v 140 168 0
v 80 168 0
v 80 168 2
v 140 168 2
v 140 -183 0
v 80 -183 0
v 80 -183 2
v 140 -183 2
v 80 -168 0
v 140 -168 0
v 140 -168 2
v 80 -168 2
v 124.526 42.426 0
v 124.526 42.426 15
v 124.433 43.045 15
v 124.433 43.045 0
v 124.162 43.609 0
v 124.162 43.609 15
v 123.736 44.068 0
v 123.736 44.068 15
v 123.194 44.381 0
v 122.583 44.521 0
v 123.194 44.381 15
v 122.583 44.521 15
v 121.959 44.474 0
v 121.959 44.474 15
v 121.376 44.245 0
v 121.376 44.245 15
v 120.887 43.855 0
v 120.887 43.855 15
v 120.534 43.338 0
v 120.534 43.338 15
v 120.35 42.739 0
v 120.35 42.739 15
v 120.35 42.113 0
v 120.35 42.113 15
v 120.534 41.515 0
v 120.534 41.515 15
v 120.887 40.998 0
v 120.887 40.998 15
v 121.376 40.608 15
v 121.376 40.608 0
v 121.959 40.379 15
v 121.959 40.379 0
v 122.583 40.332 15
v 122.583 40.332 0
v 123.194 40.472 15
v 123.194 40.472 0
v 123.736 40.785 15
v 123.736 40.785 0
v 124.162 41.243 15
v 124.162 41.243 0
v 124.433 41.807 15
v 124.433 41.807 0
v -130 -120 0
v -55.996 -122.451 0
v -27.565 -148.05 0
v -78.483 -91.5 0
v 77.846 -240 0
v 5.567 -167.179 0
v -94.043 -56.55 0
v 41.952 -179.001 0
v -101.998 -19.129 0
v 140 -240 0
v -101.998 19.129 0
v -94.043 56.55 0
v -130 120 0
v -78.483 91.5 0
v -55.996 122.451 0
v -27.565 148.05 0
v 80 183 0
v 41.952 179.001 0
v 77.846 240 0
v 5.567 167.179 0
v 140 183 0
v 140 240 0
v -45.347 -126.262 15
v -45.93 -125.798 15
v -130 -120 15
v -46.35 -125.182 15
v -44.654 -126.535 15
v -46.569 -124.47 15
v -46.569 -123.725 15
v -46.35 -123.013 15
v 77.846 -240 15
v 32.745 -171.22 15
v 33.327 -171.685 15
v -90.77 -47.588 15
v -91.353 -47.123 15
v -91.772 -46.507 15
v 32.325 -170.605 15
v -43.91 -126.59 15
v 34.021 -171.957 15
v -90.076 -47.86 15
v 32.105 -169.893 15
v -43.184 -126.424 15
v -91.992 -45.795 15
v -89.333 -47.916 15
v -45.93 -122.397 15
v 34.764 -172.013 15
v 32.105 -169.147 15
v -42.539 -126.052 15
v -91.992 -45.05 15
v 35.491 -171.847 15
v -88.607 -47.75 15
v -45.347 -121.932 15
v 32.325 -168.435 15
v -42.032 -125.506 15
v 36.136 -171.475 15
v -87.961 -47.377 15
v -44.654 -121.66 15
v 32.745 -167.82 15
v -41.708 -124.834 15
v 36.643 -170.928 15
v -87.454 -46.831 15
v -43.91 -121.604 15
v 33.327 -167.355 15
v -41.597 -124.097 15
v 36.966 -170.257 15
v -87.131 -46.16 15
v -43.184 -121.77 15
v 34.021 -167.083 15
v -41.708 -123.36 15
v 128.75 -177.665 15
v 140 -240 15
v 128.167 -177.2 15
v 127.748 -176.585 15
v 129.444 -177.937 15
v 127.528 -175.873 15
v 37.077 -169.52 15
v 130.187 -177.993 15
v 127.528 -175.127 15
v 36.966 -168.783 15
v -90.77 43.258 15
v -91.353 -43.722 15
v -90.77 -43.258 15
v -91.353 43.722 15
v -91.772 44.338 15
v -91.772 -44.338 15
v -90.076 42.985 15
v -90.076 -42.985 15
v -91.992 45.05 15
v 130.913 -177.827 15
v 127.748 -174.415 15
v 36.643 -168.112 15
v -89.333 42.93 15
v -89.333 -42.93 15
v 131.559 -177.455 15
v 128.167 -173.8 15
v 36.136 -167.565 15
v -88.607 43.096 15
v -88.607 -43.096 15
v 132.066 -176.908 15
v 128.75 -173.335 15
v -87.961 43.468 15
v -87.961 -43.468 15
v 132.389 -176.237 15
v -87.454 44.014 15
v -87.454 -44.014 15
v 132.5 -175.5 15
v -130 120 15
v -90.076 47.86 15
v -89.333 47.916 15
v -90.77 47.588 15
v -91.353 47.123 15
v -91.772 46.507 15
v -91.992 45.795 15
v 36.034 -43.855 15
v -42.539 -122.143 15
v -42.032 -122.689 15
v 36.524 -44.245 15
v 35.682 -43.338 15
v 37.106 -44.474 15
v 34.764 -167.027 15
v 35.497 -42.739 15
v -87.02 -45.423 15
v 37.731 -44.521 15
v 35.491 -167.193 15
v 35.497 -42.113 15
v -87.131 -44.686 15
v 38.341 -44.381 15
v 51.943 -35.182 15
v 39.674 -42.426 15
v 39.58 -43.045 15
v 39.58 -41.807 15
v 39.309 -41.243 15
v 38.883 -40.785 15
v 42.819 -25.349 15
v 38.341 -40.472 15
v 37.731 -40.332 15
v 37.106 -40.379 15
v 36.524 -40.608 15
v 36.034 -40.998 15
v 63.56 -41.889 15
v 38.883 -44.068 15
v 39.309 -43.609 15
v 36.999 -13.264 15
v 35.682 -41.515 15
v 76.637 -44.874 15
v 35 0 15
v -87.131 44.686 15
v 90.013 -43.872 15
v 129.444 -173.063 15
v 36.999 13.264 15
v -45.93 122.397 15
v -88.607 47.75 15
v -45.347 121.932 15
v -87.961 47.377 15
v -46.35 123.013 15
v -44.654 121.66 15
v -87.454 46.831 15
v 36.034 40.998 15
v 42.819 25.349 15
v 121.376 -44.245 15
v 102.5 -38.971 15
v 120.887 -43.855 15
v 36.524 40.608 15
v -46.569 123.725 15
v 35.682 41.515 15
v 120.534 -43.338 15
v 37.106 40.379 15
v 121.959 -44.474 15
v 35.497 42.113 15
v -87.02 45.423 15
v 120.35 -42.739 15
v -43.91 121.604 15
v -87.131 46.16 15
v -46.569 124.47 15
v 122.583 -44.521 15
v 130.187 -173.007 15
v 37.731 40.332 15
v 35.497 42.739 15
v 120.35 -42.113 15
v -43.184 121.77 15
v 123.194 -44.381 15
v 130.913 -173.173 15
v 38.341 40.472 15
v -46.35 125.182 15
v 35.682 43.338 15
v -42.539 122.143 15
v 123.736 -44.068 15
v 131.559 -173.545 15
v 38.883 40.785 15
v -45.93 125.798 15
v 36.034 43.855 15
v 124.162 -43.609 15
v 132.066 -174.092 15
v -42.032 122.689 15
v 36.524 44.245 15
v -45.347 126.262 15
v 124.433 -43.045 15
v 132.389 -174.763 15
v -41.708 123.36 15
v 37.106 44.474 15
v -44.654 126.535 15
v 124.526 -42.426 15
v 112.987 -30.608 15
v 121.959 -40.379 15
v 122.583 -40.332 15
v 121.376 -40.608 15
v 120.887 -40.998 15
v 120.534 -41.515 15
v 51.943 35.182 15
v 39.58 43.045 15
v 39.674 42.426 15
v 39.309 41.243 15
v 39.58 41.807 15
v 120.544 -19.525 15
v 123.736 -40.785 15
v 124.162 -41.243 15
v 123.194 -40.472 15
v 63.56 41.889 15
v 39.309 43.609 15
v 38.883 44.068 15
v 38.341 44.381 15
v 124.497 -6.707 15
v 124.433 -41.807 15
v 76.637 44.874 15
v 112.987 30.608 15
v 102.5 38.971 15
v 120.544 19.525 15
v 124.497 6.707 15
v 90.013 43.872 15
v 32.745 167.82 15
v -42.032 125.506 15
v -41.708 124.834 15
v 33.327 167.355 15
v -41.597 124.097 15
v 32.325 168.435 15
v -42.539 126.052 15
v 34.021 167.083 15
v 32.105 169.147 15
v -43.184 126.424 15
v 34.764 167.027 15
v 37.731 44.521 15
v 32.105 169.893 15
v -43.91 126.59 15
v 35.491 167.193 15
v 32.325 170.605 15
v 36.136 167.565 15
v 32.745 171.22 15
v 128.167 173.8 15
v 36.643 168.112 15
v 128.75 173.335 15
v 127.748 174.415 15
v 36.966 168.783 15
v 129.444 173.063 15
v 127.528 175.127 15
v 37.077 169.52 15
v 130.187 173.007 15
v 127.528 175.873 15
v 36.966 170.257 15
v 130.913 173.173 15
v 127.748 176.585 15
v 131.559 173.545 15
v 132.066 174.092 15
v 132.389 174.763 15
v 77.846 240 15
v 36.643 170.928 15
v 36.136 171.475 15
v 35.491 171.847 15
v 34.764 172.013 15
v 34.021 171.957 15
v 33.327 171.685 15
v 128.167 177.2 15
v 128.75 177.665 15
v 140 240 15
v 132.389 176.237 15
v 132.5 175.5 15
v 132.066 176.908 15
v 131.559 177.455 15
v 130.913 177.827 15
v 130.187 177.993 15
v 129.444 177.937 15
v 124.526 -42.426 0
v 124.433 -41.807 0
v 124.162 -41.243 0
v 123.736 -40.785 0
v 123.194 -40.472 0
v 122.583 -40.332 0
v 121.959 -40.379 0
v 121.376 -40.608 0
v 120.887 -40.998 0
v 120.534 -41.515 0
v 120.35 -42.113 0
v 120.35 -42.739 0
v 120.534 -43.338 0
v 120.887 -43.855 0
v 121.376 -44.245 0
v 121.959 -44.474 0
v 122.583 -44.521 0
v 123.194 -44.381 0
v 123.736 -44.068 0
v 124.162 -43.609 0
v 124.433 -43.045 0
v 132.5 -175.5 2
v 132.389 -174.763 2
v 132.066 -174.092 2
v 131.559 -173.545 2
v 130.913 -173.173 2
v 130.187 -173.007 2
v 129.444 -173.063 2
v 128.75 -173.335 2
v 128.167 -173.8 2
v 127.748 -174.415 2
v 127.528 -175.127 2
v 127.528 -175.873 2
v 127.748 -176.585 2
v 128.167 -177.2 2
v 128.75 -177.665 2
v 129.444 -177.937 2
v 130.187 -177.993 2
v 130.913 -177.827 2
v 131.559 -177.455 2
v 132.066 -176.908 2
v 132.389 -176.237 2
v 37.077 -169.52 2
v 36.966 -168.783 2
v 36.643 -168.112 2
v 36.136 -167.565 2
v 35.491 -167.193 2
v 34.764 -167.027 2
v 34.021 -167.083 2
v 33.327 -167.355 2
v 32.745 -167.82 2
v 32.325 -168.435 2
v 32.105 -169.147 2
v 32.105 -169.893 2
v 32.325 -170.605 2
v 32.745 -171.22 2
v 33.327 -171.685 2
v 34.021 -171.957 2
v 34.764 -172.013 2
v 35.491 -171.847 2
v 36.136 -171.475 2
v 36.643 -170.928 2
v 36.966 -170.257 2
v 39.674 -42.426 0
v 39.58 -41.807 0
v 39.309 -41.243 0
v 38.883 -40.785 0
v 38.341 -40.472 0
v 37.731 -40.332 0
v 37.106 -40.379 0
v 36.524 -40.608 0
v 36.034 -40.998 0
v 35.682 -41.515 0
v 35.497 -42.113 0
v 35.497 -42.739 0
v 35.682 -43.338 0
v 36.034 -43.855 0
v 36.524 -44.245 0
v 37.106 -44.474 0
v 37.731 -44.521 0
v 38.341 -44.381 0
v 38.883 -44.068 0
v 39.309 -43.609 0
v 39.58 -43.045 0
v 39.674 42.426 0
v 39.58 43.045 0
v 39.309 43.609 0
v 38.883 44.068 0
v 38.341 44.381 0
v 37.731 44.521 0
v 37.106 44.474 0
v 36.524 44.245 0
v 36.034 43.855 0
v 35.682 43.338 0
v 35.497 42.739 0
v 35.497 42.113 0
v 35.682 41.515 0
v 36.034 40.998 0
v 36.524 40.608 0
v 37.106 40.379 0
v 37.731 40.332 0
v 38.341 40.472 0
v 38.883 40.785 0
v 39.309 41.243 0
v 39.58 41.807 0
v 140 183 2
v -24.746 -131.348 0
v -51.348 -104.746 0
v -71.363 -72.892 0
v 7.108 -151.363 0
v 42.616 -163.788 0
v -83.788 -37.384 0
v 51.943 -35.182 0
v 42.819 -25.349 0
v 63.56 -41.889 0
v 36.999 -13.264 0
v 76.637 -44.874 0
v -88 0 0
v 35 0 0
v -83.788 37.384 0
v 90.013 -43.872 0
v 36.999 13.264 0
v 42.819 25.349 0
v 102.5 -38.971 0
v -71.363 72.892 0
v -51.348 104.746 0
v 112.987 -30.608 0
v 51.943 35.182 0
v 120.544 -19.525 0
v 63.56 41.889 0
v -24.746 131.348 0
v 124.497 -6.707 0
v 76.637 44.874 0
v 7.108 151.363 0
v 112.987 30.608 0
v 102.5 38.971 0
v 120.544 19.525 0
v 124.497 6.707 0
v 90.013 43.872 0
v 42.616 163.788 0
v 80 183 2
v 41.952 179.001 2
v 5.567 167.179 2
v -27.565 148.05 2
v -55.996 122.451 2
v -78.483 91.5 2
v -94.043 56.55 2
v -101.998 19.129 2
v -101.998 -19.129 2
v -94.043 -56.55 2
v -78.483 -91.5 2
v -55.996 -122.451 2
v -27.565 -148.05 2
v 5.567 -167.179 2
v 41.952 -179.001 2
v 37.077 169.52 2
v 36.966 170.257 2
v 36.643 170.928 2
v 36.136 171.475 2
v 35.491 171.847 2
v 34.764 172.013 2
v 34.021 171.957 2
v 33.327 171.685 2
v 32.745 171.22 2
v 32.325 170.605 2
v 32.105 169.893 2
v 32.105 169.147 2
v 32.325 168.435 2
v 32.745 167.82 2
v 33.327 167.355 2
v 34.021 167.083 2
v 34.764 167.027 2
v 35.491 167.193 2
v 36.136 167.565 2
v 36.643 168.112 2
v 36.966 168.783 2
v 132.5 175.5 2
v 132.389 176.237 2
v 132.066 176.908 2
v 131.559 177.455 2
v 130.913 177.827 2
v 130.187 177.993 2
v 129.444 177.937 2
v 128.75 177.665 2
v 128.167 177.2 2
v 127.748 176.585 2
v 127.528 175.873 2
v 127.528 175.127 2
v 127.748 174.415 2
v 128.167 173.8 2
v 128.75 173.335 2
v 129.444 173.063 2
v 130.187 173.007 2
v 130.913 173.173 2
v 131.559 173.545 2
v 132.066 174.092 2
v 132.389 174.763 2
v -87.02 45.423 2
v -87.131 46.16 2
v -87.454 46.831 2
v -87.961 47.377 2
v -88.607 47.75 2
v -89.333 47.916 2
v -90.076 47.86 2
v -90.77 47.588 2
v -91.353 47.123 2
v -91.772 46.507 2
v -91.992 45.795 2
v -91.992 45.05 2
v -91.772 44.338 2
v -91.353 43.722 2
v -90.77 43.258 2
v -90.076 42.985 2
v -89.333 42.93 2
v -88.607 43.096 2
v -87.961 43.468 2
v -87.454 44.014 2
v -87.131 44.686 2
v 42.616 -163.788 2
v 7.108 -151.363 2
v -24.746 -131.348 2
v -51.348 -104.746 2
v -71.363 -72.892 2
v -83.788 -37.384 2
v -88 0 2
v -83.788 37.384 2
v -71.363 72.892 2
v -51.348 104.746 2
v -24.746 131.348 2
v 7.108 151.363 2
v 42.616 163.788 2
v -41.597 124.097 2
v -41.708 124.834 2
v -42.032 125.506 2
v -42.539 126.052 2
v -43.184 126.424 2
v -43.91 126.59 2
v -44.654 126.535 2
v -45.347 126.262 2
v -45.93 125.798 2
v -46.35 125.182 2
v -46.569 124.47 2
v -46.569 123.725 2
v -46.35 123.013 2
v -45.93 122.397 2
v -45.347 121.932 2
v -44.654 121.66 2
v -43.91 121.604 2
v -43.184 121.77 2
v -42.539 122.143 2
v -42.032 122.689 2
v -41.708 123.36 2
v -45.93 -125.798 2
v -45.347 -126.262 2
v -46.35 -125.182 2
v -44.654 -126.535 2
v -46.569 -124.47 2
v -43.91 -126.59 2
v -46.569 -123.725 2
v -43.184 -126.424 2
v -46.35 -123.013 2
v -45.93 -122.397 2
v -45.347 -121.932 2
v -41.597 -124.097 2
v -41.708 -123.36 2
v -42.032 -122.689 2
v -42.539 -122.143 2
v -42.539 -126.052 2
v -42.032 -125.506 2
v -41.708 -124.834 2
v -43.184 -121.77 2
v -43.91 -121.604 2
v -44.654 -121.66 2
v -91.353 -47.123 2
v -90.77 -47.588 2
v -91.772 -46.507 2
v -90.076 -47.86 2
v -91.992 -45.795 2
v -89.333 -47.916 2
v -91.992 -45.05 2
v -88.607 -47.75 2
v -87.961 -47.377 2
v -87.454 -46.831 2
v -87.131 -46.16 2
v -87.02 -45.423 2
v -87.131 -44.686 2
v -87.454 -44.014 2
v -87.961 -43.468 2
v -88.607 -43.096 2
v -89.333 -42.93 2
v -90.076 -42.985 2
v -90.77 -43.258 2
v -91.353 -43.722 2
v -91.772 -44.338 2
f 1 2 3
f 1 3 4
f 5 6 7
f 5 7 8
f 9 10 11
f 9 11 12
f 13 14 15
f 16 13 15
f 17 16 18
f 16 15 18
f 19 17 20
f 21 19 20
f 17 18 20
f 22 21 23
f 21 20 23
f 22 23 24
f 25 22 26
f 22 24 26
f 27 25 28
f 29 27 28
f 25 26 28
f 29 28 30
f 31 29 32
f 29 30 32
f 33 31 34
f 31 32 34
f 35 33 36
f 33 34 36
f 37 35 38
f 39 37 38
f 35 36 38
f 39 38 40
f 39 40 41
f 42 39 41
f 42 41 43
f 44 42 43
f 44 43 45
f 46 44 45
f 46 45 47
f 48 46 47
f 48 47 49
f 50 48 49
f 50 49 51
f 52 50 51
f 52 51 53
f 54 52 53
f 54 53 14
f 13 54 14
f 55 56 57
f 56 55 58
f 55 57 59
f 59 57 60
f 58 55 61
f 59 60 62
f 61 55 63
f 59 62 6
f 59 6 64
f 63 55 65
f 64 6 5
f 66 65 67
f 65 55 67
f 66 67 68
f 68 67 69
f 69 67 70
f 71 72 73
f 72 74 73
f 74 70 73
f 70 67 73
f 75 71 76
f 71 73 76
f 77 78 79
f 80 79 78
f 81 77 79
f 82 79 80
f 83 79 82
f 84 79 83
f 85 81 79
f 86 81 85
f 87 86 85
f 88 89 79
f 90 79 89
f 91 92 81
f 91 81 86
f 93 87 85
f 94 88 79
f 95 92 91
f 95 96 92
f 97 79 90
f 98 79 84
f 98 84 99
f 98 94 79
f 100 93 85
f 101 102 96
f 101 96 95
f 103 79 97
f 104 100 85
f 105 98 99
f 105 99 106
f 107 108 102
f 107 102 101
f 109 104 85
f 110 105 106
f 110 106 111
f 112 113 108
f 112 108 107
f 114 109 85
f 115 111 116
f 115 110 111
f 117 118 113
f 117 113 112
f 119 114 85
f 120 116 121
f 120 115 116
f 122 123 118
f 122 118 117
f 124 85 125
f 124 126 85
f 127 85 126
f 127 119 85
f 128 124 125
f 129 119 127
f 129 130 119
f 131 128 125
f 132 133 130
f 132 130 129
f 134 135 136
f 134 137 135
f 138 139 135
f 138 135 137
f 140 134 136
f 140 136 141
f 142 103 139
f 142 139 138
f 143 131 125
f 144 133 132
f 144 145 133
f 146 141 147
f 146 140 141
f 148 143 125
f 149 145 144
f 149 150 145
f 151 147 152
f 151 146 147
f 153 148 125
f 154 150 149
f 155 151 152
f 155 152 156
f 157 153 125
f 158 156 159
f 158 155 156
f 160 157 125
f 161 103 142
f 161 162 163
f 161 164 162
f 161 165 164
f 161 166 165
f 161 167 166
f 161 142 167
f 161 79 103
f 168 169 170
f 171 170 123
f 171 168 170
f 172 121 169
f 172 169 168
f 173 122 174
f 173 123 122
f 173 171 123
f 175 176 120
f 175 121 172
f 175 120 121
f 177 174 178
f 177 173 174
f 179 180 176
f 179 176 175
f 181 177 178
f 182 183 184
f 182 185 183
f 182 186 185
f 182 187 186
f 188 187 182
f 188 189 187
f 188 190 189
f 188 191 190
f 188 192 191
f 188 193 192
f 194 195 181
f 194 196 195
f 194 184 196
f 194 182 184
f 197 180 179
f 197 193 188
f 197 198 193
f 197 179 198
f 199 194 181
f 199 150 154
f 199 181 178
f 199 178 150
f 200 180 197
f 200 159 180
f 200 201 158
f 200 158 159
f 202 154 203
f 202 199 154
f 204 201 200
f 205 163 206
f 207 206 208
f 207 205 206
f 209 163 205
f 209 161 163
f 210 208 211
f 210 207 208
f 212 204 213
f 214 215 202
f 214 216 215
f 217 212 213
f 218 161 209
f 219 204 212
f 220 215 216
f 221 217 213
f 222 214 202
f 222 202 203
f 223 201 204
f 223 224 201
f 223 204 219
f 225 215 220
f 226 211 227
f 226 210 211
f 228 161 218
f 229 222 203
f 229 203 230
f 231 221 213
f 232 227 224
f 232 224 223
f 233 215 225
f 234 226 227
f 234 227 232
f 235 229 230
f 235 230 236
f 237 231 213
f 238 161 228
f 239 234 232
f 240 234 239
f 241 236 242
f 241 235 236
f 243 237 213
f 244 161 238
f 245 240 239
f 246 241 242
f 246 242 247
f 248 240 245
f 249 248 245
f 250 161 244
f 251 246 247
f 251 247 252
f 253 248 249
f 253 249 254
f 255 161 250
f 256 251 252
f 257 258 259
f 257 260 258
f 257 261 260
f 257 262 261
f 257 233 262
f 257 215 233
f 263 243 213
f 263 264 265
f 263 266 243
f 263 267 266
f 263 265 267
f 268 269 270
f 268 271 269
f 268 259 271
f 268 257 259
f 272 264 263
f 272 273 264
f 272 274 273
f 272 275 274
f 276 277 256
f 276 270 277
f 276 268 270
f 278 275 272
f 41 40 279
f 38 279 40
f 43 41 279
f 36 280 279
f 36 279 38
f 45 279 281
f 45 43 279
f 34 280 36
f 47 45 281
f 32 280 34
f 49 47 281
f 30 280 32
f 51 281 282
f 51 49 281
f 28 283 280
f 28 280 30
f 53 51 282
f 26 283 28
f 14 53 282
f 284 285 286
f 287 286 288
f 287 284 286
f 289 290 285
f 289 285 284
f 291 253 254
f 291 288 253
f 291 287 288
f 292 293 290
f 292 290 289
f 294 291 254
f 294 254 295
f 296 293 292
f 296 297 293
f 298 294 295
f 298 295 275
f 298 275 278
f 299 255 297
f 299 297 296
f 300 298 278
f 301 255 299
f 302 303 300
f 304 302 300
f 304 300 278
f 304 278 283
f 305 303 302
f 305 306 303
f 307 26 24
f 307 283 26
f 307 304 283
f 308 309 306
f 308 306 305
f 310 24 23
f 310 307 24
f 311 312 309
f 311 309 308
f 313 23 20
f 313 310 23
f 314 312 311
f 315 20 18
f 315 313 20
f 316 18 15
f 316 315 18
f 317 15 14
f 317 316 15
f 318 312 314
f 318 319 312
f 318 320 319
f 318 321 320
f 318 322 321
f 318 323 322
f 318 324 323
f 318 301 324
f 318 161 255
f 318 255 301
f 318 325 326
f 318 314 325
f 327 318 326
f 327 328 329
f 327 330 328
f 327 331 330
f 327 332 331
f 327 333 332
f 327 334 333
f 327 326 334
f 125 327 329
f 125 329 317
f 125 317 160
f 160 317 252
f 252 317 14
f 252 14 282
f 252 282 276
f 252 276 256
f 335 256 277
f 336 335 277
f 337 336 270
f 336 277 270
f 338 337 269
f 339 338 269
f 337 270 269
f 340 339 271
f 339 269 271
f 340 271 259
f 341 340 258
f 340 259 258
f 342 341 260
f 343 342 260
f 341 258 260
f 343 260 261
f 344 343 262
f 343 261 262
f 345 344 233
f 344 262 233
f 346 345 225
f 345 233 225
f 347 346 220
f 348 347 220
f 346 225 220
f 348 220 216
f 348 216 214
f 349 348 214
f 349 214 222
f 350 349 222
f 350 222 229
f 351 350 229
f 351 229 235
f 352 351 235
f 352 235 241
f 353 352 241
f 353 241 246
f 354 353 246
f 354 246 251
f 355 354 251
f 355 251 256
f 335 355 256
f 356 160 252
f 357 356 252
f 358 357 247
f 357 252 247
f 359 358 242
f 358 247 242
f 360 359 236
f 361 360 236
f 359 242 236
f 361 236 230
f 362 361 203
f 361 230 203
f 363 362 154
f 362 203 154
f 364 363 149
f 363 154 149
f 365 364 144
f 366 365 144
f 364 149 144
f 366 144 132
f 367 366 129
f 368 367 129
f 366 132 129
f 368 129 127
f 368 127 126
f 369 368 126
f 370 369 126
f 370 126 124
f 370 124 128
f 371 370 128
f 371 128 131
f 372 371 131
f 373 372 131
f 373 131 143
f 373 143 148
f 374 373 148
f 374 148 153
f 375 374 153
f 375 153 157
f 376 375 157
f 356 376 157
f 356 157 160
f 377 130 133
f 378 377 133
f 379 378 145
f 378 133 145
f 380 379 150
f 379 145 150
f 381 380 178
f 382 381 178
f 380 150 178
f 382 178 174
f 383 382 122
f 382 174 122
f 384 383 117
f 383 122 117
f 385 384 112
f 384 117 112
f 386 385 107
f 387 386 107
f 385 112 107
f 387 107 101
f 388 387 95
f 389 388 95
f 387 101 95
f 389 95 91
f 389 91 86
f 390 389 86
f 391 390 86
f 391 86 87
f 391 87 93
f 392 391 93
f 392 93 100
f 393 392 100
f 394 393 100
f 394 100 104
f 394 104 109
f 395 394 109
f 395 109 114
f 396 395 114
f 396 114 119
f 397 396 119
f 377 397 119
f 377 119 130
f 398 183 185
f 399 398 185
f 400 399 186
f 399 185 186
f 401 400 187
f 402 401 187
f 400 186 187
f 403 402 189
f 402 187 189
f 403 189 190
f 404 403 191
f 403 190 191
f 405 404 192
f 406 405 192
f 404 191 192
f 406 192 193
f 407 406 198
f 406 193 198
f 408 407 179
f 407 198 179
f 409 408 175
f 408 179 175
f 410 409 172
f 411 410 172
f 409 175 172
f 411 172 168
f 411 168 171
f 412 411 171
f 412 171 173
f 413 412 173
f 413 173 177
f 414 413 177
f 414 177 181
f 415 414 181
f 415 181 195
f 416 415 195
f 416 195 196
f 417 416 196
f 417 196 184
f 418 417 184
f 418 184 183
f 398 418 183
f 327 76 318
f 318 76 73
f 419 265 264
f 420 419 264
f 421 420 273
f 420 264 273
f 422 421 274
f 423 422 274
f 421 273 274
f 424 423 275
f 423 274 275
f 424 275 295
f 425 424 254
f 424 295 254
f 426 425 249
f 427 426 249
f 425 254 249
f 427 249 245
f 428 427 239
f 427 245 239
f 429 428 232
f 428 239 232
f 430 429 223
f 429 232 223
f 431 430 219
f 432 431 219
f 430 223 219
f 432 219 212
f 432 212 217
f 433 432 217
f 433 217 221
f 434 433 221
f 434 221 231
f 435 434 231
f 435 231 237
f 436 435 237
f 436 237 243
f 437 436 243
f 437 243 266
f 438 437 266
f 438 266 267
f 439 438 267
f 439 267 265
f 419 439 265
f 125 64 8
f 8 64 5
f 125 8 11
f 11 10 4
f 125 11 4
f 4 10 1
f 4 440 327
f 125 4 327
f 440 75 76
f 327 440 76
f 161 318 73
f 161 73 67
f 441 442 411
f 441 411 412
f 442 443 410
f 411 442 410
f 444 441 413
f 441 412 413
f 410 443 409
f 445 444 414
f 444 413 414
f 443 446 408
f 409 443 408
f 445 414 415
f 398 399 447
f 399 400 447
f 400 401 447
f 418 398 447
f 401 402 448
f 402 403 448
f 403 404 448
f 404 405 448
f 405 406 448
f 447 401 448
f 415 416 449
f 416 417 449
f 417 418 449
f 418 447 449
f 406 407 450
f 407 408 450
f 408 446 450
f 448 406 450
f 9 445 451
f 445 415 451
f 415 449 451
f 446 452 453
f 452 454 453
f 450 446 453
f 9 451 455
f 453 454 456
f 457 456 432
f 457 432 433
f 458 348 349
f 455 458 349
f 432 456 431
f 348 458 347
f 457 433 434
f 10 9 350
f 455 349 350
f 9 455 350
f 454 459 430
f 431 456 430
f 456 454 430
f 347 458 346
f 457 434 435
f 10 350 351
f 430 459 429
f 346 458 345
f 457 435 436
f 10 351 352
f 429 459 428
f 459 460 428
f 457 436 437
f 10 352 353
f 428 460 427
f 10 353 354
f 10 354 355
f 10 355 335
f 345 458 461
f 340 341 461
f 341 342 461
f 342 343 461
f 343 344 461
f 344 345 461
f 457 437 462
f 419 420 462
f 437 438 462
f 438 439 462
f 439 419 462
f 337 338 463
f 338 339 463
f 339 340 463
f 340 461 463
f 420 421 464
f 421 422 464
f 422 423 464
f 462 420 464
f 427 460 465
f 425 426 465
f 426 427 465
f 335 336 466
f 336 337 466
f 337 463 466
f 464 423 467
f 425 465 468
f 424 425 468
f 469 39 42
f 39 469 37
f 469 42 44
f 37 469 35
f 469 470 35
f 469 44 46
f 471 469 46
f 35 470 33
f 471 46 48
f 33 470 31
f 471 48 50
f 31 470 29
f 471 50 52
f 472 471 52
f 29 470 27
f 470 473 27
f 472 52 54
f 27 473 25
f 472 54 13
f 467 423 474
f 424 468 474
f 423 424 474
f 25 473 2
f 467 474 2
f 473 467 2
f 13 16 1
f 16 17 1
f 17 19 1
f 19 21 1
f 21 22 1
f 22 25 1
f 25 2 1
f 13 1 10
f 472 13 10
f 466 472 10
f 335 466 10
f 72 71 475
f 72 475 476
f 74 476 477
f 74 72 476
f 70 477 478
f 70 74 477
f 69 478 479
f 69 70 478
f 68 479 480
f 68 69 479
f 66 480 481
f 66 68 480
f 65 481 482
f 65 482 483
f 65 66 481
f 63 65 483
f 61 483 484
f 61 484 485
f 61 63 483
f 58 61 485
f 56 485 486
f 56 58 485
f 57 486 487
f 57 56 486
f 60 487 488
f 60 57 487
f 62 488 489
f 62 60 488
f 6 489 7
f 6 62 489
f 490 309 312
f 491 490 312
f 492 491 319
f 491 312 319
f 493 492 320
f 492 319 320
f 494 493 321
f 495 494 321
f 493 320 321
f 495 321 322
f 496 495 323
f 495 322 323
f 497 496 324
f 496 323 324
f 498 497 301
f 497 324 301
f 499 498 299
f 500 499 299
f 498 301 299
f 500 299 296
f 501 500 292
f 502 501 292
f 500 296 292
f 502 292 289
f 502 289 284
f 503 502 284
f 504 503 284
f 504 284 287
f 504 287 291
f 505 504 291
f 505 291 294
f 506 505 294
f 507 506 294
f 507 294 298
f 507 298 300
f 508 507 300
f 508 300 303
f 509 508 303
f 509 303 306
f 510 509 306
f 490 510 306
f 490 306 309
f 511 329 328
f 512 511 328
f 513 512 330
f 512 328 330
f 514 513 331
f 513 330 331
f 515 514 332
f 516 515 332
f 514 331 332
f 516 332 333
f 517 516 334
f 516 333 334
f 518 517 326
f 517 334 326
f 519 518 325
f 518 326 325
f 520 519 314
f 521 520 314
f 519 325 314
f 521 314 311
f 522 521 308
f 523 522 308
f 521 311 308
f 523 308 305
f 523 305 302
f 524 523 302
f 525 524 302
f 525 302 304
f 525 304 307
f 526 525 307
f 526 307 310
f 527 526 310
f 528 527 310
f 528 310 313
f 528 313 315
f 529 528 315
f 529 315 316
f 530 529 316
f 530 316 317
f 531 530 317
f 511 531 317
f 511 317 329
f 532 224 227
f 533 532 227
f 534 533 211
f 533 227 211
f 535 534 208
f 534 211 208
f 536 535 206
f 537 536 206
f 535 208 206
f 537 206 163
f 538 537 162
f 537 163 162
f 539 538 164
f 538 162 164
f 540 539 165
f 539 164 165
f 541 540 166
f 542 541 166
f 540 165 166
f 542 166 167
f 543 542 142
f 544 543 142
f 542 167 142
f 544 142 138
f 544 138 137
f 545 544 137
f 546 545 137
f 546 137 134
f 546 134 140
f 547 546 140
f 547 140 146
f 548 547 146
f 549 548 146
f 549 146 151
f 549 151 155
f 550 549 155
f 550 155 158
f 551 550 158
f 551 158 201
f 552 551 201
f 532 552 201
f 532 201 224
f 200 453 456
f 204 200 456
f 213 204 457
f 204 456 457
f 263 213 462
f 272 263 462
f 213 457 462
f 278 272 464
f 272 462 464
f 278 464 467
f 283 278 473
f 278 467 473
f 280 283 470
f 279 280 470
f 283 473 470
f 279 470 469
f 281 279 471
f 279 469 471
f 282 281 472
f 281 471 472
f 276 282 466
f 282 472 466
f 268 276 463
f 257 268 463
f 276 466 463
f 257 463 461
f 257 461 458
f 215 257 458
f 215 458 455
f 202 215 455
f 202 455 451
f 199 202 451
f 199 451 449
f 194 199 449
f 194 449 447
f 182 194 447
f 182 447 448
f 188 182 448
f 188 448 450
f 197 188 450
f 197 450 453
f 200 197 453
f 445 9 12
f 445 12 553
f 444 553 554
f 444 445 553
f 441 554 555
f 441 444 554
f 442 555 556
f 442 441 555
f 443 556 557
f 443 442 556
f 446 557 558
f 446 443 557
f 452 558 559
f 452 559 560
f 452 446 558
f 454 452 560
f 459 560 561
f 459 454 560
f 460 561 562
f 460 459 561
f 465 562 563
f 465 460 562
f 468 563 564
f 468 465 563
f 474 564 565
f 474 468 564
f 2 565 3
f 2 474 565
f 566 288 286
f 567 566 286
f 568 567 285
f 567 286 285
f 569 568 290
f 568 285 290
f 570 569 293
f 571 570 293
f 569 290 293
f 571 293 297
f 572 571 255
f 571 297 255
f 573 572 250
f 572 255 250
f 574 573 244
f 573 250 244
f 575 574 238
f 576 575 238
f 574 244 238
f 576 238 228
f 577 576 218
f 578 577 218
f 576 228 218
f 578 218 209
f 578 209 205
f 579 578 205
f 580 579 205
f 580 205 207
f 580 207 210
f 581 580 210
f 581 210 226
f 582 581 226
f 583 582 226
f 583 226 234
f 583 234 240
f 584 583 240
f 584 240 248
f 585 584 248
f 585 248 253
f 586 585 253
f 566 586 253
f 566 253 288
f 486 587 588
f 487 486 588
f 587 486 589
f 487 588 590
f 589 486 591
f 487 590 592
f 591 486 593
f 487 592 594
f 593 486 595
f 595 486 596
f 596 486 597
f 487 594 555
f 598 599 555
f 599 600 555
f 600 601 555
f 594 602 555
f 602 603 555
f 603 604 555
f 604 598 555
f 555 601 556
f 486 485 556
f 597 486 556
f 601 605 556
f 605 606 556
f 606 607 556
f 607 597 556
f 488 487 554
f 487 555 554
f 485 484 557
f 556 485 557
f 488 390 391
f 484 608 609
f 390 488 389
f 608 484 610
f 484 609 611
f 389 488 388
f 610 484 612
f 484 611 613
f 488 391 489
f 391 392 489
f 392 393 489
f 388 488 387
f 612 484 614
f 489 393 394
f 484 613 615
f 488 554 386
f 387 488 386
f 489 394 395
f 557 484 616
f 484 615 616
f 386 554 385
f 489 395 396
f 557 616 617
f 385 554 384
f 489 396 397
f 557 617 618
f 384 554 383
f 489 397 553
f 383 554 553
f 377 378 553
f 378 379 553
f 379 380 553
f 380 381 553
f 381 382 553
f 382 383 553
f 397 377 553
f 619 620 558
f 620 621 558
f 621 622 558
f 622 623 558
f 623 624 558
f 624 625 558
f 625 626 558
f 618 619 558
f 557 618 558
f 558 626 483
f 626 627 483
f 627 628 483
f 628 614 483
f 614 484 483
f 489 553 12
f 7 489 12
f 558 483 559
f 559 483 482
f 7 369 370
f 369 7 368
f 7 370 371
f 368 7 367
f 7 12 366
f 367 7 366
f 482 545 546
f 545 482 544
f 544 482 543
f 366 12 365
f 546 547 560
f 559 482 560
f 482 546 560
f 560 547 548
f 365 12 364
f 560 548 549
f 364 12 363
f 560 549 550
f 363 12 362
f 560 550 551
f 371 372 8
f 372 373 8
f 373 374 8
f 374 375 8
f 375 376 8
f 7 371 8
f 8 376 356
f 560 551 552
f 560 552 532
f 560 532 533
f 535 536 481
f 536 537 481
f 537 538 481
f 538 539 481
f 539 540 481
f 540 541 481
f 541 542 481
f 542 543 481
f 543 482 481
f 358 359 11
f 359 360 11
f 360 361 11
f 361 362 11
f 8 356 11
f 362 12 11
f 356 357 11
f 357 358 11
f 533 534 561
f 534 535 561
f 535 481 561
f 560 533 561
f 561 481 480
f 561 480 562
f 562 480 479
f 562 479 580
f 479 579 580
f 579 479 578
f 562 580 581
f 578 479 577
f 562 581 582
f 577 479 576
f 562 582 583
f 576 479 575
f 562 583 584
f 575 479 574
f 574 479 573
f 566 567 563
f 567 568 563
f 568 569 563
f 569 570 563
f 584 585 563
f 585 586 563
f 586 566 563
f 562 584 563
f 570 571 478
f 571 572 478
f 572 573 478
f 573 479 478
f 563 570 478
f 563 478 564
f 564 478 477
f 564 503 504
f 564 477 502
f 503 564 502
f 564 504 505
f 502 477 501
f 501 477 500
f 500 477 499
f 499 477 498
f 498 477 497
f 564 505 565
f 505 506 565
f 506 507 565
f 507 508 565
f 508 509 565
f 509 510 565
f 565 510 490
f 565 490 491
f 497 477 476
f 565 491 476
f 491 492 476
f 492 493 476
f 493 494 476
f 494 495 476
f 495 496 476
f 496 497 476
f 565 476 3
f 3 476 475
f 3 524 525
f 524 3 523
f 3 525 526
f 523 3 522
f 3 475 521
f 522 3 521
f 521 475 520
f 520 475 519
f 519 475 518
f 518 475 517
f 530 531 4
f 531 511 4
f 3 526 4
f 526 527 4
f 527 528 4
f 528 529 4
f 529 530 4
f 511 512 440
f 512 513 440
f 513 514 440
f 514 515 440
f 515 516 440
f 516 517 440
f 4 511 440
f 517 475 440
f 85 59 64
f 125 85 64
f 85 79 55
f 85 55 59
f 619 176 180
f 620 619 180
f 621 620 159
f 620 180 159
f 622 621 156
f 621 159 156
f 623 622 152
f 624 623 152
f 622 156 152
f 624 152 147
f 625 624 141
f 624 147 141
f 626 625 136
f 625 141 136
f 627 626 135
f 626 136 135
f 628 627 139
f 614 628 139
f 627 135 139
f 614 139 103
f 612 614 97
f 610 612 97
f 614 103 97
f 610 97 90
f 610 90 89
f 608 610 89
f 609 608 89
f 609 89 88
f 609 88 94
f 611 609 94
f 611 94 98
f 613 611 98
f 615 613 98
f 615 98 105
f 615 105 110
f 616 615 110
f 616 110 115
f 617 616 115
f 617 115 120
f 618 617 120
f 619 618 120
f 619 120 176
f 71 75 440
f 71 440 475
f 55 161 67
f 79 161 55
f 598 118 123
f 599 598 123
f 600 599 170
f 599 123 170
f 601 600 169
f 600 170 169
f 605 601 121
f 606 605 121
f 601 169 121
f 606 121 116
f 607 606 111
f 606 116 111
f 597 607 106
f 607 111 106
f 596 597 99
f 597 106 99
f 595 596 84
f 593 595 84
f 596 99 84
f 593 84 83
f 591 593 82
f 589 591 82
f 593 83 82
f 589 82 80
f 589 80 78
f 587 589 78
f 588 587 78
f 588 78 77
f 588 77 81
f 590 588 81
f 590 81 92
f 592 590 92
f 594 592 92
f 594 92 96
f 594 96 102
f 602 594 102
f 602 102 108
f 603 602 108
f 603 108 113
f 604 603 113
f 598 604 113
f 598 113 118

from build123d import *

# Parameters (mm, degrees)
EXTRUDE_1_DEPTH          = 15
CUT_EXTRUDE_2_DEPTH      = 2
SKETCH_2_R               = 45
CUT_EXTRUDE_3_DEPTH      = 279.25348156
CUT_EXTRUDE_4_DEPTH      = 279.25348156
CUT_EXTRUDE_4_DEPTH_BACK = 279.25348156
HOLE_WIZARD_M5_1_D       = 4.2
HOLE_WIZARD_M6_1_D       = 5


with BuildPart() as part:
    # 草图1 → 凸台-拉伸1 (new body)
    with BuildSketch(Plane.XY):
        with BuildLine():
            Line((140, 183), (140, 240))
            Line((140, 240), (-140, 240))
            Line((-140, 240), (-140, -240))
            Line((-140, -240), (140, -240))
            Line((140, -240), (140, -183))
            Line((140, -183), (80, -183))
            ThreePointArc((80, -183), (-103, 0), (80, 183))
            Line((80, 183), (140, 183))
        make_face()
        with BuildLine():
            Line((140, -168), (140, 168))
            Line((140, 168), (80, 168))
            ThreePointArc((80, 168), (-88, 0), (80, -168))
            Line((80, -168), (140, -168))
        make_face()
        with BuildLine():
            Line((140, 168), (140, 183))
            Line((140, 183), (80, 183))
            ThreePointArc((80, 183), (-103, 0), (80, -183))
            Line((80, -183), (140, -183))
            Line((140, -183), (140, -168))
            Line((140, -168), (80, -168))
            ThreePointArc((80, -168), (-88, 0), (80, 168))
            Line((80, 168), (140, 168))
        make_face()
    extrude(amount=EXTRUDE_1_DEPTH)

    # 草图1<4> → 切除-拉伸2 (cut)
    with BuildSketch(Plane.XY):
        with BuildLine():
            Line((140, 168), (140, 183))
            Line((140, 183), (80, 183))
            ThreePointArc((80, 183), (-103, 0), (80, -183))
            Line((80, -183), (140, -183))
            Line((140, -183), (140, -168))
            Line((140, -168), (80, -168))
            ThreePointArc((80, -168), (-88, 0), (80, 168))
            Line((80, 168), (140, 168))
        make_face()
    extrude(amount=CUT_EXTRUDE_2_DEPTH, mode=Mode.SUBTRACT)

    # 草图2 → 切除-拉伸3 (cut, through all)
    with BuildSketch(Plane(origin=(0, 0, 0), x_dir=(-1, 0, 0), z_dir=(0, 0, -1))):
        with Locations((-80, 0)):
            Circle(SKETCH_2_R)
    extrude(amount=-CUT_EXTRUDE_3_DEPTH, mode=Mode.SUBTRACT)

    # 草图3 → 切除-拉伸4 (cut, two sides: drawn at the far end of the back side and taken through both)
    with BuildSketch(Plane(origin=(0, 0, 0), x_dir=(-1, 0, 0), z_dir=(0, 0, -1)).offset(-CUT_EXTRUDE_4_DEPTH_BACK)):
        Polygon((140, 240), (-77.846096908, 240), (130, 120), (130, -120), (-77.846096908, -240), (140, -240), align=None)
    extrude(amount=CUT_EXTRUDE_4_DEPTH + CUT_EXTRUDE_4_DEPTH_BACK, mode=Mode.SUBTRACT)

    # M5 螺纹孔1 (through all)
    with Locations(Plane(origin=(0, 0, 0), x_dir=(-1, 0, 0), z_dir=(0, 0, -1))):
        with Locations((-122.426406871, 42.426406871), (-37.573593129, 42.426406871), (-37.573593129, -42.426406871), (-122.426406871, -42.426406871)):
            Hole(HOLE_WIZARD_M5_1_D / 2)

    # M6 螺纹孔1 (through all)
    with Locations(Plane(origin=(130, 175.5, 2), x_dir=(-1, 0, 0), z_dir=(0, 0, -1))):
        with Locations((0, 0), (95.422742415, -5.980017486), (174.097240098, -51.402759902), (219.519982514, -130.077257585), (219.519982514, -220.922742415), (174.097240098, -299.597240098), (95.422742415, -345.019982514), (0, -351)):
            Hole(HOLE_WIZARD_M6_1_D / 2)


solid = part.part
